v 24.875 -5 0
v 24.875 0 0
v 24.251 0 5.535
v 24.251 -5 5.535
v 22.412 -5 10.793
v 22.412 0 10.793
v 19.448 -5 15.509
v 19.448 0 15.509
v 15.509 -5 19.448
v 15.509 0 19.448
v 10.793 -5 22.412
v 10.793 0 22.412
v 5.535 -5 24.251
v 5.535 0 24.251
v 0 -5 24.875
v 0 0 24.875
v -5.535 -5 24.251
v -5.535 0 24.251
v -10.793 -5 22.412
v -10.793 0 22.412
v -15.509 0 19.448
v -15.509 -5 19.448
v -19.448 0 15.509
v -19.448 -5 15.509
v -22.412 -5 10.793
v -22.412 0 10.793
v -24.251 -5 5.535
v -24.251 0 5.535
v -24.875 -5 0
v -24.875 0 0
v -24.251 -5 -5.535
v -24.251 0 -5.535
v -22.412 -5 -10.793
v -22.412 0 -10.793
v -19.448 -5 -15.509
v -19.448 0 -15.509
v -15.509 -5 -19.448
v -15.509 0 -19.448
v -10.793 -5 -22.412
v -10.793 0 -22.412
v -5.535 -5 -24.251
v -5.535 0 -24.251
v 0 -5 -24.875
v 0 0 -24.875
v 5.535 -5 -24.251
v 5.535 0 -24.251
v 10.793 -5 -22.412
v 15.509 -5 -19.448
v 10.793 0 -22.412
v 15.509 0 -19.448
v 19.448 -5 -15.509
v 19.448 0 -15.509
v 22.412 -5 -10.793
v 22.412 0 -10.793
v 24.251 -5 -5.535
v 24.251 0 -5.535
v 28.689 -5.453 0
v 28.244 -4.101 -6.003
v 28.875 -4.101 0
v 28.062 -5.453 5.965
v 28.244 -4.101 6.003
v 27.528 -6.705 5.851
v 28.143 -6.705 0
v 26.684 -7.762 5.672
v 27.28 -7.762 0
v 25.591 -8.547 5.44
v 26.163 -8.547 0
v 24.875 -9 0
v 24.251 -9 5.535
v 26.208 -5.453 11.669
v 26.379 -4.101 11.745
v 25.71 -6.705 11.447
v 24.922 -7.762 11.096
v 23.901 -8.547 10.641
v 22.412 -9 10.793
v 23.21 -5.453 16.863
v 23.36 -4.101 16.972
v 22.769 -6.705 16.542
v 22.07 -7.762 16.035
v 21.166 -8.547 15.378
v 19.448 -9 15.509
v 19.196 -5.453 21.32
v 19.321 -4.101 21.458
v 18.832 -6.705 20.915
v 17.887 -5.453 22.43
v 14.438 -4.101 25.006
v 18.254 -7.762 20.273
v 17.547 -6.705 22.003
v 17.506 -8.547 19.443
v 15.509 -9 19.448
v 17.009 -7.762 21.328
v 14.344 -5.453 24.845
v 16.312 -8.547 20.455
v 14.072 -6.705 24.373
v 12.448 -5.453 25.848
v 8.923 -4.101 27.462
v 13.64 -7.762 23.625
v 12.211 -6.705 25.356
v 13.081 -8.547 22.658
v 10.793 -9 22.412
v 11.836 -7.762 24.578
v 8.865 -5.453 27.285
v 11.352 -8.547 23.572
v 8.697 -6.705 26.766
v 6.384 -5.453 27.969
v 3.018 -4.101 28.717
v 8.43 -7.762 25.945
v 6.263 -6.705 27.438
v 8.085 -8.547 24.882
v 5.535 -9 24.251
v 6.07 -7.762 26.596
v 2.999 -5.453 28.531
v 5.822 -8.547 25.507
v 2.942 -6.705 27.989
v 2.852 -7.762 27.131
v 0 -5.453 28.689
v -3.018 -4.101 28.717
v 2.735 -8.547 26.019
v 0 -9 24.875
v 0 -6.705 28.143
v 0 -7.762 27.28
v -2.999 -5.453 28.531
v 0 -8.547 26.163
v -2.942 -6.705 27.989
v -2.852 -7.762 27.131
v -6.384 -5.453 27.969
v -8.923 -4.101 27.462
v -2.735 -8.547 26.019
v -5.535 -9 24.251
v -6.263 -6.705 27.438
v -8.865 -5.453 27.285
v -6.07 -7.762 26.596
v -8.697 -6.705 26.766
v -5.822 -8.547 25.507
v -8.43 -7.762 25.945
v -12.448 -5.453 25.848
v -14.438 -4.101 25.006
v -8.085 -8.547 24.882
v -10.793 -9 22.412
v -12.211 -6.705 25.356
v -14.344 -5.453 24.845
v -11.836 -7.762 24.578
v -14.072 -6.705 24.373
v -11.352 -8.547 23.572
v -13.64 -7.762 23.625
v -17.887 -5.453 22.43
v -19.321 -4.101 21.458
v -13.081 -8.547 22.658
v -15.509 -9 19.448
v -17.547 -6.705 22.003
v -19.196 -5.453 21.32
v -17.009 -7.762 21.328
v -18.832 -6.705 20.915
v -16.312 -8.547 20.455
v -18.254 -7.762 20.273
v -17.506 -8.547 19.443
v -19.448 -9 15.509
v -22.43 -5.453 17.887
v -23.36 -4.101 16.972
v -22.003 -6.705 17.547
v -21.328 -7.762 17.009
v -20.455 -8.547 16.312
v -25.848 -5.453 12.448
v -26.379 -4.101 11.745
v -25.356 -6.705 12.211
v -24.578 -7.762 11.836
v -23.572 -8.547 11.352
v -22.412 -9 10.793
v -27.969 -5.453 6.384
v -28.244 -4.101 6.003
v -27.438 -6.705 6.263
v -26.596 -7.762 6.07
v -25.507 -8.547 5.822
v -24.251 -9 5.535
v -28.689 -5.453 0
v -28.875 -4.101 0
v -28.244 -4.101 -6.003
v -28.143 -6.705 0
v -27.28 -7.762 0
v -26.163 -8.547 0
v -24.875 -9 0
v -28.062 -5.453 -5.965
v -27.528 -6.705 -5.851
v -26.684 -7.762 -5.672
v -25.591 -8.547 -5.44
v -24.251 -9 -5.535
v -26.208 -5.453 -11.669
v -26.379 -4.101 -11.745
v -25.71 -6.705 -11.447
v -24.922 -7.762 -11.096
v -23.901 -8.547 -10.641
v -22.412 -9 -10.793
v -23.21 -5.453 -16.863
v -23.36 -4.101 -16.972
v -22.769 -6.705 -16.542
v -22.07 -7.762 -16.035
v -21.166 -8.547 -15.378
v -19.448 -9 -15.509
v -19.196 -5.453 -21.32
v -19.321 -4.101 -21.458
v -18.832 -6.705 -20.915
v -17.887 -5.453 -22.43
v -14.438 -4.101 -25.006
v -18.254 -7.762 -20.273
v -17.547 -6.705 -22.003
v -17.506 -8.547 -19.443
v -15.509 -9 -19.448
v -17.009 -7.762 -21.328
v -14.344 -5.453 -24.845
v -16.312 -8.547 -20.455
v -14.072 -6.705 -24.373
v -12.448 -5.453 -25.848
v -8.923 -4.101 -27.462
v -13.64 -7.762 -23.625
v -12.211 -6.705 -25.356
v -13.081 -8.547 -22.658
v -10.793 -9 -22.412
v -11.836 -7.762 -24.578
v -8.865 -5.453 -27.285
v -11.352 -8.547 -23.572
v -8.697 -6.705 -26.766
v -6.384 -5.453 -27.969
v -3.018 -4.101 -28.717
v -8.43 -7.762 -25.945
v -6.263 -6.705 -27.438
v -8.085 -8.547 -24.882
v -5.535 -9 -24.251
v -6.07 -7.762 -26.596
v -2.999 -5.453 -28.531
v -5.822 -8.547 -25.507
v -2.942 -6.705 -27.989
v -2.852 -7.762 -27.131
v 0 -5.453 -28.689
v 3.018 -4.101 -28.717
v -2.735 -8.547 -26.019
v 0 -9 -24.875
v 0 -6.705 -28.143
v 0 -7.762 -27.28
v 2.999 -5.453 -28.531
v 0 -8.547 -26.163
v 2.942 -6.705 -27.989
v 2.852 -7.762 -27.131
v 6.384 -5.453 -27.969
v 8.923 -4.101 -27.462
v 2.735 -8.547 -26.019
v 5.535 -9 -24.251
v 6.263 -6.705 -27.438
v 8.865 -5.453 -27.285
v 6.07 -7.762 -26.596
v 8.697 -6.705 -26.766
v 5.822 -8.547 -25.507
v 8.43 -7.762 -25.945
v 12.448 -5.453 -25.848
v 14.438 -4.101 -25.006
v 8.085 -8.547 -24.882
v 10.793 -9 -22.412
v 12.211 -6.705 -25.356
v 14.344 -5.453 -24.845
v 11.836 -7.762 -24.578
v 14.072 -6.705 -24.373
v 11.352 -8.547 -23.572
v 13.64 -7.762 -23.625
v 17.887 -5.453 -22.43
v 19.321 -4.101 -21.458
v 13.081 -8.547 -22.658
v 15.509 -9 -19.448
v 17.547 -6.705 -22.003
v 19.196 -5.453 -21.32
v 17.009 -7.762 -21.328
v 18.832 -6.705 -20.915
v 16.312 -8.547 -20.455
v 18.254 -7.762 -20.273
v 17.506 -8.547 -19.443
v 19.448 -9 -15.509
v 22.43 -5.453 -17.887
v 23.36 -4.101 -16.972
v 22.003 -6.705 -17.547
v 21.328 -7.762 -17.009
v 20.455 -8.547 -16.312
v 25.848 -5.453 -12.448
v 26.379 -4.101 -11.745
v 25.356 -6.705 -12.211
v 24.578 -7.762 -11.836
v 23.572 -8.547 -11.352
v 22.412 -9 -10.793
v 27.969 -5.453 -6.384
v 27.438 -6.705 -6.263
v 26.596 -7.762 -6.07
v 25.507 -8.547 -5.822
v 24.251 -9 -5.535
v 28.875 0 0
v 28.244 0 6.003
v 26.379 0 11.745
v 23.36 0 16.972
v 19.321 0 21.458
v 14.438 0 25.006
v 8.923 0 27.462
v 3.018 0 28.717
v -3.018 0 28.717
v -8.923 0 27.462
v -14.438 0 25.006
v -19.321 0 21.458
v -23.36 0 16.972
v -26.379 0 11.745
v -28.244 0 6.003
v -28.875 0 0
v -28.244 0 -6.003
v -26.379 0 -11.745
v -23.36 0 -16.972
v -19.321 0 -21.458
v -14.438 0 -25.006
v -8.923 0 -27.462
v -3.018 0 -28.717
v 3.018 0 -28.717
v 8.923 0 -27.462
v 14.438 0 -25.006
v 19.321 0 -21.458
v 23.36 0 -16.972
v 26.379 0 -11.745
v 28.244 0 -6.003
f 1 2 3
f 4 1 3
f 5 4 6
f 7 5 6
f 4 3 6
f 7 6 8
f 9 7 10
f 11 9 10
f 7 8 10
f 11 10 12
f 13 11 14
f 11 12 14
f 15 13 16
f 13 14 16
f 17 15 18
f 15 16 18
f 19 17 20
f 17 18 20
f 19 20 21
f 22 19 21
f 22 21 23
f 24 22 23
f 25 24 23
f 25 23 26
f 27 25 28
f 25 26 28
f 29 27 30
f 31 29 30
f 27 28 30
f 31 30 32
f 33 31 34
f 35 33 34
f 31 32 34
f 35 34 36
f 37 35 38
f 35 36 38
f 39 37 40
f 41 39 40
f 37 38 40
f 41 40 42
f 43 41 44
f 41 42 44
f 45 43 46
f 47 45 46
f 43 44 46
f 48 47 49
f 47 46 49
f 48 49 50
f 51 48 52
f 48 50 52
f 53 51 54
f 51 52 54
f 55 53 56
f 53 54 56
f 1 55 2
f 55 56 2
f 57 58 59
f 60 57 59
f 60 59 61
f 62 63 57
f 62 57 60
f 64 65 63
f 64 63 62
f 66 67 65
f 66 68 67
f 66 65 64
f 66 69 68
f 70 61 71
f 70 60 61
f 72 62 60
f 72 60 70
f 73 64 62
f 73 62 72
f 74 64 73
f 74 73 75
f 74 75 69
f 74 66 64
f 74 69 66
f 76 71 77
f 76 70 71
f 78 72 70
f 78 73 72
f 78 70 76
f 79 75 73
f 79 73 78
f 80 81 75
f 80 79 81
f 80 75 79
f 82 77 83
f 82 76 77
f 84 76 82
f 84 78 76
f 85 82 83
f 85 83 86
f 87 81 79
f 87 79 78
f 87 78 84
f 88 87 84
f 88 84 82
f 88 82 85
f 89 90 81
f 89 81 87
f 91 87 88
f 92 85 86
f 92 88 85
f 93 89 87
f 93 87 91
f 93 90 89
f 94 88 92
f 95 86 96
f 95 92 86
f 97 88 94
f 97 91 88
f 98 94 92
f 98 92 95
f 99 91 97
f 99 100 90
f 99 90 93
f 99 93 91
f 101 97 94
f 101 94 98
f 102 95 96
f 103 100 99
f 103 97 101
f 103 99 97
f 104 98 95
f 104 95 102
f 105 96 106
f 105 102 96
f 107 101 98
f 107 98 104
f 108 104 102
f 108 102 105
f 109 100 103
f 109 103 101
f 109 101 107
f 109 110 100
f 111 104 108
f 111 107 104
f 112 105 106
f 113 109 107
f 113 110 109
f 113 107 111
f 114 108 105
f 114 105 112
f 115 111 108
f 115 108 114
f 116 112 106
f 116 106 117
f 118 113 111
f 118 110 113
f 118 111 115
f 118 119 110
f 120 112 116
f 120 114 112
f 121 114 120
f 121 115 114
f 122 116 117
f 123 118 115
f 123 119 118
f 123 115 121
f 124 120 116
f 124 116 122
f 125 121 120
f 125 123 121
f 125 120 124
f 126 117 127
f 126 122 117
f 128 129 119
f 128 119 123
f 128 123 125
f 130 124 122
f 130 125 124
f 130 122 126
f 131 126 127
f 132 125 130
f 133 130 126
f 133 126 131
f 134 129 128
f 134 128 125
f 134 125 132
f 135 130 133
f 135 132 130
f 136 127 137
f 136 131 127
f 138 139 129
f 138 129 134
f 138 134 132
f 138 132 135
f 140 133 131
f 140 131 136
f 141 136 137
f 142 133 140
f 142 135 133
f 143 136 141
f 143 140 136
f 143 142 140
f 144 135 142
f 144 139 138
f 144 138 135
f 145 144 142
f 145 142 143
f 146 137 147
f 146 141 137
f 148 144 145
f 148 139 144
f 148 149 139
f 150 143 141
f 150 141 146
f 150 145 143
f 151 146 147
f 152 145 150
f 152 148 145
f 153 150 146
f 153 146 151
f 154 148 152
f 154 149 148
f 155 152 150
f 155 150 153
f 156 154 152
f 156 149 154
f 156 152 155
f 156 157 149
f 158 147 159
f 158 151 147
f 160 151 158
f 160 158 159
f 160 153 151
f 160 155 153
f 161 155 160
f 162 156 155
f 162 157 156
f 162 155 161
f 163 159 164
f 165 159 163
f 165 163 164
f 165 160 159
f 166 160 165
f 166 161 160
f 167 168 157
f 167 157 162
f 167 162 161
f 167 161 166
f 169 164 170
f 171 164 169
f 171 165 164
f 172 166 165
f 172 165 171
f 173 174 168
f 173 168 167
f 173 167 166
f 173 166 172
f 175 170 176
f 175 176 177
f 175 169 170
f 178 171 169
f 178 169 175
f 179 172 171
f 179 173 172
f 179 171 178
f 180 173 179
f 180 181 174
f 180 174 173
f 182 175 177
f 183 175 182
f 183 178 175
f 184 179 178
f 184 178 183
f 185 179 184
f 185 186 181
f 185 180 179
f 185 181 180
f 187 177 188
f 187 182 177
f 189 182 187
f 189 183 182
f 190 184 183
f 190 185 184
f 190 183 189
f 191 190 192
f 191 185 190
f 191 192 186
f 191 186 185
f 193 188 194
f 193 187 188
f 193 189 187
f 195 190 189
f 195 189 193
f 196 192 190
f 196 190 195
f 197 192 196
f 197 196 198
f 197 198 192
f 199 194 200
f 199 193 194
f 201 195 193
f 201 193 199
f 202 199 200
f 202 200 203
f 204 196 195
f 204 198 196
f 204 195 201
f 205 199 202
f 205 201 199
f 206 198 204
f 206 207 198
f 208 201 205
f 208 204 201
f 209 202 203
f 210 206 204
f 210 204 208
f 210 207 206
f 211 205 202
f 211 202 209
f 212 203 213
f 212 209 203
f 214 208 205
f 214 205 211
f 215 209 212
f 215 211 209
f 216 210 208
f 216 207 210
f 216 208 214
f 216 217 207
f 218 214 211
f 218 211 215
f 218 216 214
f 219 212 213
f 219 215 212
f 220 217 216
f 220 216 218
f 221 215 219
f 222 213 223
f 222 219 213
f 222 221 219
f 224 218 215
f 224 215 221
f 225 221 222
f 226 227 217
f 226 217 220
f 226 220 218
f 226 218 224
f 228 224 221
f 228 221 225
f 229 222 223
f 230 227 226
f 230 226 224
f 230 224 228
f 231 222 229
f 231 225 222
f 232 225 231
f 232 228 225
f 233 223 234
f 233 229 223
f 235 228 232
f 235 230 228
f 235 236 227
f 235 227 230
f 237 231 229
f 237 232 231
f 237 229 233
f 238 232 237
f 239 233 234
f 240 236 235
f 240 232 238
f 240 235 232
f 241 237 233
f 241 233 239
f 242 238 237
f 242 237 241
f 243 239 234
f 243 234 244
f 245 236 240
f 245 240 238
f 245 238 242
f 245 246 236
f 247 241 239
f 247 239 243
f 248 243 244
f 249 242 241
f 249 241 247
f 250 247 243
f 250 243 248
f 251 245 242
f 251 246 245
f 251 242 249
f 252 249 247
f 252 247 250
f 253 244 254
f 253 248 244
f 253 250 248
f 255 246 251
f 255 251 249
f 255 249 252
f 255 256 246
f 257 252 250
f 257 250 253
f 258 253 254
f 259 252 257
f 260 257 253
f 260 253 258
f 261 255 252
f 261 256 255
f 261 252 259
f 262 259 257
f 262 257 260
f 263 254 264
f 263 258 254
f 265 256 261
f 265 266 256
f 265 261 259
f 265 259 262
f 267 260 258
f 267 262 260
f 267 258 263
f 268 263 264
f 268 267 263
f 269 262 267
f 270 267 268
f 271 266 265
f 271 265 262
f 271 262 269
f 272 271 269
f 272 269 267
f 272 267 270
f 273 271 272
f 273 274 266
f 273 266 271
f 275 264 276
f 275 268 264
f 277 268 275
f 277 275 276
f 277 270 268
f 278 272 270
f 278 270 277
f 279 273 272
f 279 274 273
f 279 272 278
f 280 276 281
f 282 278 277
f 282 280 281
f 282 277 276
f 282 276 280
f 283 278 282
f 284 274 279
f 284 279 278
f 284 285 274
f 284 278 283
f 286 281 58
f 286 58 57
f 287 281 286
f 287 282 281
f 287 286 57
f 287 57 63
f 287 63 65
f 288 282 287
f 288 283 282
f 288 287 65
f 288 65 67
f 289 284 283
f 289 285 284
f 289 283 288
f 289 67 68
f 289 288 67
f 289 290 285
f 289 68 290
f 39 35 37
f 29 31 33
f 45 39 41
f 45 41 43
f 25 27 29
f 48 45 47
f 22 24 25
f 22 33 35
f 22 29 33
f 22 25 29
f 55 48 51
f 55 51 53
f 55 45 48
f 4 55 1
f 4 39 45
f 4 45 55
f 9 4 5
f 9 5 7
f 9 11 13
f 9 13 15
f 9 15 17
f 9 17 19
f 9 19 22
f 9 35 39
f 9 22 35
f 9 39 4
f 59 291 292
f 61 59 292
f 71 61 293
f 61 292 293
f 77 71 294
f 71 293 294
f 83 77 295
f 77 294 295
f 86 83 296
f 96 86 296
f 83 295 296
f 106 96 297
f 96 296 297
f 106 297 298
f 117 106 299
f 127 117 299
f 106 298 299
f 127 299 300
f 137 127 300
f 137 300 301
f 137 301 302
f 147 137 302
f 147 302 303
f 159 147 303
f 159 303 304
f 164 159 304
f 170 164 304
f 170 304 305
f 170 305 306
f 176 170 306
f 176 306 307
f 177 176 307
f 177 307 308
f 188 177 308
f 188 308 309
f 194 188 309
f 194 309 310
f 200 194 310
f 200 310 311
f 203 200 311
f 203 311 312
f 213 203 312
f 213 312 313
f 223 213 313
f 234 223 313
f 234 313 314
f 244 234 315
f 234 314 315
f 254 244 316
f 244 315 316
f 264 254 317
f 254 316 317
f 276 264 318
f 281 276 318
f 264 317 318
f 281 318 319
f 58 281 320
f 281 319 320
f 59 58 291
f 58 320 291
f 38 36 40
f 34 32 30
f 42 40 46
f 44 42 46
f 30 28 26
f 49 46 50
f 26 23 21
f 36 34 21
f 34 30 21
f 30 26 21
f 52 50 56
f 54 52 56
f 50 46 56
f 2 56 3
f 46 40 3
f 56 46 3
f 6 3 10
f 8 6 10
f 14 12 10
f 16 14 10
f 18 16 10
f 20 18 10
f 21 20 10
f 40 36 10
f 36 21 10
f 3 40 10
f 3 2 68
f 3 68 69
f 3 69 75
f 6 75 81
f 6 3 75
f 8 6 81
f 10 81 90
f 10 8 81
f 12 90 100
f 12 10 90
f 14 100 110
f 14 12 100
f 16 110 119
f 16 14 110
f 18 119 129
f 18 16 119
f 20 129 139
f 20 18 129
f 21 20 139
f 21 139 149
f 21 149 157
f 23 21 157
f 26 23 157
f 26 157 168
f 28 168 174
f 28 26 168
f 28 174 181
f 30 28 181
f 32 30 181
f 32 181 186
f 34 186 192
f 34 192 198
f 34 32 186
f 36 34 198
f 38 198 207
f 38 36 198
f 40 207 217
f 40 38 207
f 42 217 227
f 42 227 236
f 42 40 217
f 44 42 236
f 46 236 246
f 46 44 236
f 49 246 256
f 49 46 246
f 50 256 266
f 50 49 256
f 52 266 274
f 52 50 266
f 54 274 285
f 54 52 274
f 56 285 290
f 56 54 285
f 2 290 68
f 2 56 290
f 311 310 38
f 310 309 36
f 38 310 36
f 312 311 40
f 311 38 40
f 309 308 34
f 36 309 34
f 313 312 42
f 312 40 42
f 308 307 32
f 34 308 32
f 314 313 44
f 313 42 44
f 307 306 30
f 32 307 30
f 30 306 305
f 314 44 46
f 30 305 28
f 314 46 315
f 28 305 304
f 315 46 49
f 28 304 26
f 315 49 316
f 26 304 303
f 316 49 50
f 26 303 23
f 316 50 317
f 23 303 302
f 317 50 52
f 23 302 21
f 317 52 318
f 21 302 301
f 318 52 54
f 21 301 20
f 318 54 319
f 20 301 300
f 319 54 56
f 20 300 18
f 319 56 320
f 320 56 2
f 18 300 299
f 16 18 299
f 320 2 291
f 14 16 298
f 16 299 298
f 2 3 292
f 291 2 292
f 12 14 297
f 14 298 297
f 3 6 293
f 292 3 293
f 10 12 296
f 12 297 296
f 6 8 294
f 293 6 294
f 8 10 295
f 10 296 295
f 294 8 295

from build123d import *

# Parameters (mm, degrees)
F0_R     = 24.875
F1_DEPTH = 5
F0_R_2   = 28.875
F2_DEPTH = 9


# Not quite as in the source:
# - a fillet or chamfer that OpenCascade refuses, or shapes differently, is made with other operations: its cross-section is extruded or revolved along the edge and cut away or added


with BuildPart() as f1:
    # F0 (on Front) → F1 (new body)
    with BuildSketch(Plane.XZ):
        Circle(F0_R)
    extrude(amount=F1_DEPTH)


with BuildPart() as f2:
    # F0 (on Front) → F2 (new body)
    with BuildSketch(Plane.XZ):
        Circle(F0_R_2)
        Circle(F0_R, mode=Mode.SUBTRACT)
    extrude(amount=F2_DEPTH)

    # F3: fillet of radius 5 on 1 edges, made by hand

    # F3_s1 → F3_t2 (revolve, cut)
    with BuildSketch(Plane.XY):
        with BuildLine():
            ThreePointArc((28.875, -4.1010205144), (27.7479833462, -7.2632981746), (24.875, -9))
            Line((24.875, -9), (28.875, -9))
            Line((28.875, -9), (28.875, -4.1010205144))
        make_face()
    revolve(axis=Axis((0, -9, 0), (0, -1, 0)), mode=Mode.SUBTRACT)


solid = Compound([f1.part, f2.part])
